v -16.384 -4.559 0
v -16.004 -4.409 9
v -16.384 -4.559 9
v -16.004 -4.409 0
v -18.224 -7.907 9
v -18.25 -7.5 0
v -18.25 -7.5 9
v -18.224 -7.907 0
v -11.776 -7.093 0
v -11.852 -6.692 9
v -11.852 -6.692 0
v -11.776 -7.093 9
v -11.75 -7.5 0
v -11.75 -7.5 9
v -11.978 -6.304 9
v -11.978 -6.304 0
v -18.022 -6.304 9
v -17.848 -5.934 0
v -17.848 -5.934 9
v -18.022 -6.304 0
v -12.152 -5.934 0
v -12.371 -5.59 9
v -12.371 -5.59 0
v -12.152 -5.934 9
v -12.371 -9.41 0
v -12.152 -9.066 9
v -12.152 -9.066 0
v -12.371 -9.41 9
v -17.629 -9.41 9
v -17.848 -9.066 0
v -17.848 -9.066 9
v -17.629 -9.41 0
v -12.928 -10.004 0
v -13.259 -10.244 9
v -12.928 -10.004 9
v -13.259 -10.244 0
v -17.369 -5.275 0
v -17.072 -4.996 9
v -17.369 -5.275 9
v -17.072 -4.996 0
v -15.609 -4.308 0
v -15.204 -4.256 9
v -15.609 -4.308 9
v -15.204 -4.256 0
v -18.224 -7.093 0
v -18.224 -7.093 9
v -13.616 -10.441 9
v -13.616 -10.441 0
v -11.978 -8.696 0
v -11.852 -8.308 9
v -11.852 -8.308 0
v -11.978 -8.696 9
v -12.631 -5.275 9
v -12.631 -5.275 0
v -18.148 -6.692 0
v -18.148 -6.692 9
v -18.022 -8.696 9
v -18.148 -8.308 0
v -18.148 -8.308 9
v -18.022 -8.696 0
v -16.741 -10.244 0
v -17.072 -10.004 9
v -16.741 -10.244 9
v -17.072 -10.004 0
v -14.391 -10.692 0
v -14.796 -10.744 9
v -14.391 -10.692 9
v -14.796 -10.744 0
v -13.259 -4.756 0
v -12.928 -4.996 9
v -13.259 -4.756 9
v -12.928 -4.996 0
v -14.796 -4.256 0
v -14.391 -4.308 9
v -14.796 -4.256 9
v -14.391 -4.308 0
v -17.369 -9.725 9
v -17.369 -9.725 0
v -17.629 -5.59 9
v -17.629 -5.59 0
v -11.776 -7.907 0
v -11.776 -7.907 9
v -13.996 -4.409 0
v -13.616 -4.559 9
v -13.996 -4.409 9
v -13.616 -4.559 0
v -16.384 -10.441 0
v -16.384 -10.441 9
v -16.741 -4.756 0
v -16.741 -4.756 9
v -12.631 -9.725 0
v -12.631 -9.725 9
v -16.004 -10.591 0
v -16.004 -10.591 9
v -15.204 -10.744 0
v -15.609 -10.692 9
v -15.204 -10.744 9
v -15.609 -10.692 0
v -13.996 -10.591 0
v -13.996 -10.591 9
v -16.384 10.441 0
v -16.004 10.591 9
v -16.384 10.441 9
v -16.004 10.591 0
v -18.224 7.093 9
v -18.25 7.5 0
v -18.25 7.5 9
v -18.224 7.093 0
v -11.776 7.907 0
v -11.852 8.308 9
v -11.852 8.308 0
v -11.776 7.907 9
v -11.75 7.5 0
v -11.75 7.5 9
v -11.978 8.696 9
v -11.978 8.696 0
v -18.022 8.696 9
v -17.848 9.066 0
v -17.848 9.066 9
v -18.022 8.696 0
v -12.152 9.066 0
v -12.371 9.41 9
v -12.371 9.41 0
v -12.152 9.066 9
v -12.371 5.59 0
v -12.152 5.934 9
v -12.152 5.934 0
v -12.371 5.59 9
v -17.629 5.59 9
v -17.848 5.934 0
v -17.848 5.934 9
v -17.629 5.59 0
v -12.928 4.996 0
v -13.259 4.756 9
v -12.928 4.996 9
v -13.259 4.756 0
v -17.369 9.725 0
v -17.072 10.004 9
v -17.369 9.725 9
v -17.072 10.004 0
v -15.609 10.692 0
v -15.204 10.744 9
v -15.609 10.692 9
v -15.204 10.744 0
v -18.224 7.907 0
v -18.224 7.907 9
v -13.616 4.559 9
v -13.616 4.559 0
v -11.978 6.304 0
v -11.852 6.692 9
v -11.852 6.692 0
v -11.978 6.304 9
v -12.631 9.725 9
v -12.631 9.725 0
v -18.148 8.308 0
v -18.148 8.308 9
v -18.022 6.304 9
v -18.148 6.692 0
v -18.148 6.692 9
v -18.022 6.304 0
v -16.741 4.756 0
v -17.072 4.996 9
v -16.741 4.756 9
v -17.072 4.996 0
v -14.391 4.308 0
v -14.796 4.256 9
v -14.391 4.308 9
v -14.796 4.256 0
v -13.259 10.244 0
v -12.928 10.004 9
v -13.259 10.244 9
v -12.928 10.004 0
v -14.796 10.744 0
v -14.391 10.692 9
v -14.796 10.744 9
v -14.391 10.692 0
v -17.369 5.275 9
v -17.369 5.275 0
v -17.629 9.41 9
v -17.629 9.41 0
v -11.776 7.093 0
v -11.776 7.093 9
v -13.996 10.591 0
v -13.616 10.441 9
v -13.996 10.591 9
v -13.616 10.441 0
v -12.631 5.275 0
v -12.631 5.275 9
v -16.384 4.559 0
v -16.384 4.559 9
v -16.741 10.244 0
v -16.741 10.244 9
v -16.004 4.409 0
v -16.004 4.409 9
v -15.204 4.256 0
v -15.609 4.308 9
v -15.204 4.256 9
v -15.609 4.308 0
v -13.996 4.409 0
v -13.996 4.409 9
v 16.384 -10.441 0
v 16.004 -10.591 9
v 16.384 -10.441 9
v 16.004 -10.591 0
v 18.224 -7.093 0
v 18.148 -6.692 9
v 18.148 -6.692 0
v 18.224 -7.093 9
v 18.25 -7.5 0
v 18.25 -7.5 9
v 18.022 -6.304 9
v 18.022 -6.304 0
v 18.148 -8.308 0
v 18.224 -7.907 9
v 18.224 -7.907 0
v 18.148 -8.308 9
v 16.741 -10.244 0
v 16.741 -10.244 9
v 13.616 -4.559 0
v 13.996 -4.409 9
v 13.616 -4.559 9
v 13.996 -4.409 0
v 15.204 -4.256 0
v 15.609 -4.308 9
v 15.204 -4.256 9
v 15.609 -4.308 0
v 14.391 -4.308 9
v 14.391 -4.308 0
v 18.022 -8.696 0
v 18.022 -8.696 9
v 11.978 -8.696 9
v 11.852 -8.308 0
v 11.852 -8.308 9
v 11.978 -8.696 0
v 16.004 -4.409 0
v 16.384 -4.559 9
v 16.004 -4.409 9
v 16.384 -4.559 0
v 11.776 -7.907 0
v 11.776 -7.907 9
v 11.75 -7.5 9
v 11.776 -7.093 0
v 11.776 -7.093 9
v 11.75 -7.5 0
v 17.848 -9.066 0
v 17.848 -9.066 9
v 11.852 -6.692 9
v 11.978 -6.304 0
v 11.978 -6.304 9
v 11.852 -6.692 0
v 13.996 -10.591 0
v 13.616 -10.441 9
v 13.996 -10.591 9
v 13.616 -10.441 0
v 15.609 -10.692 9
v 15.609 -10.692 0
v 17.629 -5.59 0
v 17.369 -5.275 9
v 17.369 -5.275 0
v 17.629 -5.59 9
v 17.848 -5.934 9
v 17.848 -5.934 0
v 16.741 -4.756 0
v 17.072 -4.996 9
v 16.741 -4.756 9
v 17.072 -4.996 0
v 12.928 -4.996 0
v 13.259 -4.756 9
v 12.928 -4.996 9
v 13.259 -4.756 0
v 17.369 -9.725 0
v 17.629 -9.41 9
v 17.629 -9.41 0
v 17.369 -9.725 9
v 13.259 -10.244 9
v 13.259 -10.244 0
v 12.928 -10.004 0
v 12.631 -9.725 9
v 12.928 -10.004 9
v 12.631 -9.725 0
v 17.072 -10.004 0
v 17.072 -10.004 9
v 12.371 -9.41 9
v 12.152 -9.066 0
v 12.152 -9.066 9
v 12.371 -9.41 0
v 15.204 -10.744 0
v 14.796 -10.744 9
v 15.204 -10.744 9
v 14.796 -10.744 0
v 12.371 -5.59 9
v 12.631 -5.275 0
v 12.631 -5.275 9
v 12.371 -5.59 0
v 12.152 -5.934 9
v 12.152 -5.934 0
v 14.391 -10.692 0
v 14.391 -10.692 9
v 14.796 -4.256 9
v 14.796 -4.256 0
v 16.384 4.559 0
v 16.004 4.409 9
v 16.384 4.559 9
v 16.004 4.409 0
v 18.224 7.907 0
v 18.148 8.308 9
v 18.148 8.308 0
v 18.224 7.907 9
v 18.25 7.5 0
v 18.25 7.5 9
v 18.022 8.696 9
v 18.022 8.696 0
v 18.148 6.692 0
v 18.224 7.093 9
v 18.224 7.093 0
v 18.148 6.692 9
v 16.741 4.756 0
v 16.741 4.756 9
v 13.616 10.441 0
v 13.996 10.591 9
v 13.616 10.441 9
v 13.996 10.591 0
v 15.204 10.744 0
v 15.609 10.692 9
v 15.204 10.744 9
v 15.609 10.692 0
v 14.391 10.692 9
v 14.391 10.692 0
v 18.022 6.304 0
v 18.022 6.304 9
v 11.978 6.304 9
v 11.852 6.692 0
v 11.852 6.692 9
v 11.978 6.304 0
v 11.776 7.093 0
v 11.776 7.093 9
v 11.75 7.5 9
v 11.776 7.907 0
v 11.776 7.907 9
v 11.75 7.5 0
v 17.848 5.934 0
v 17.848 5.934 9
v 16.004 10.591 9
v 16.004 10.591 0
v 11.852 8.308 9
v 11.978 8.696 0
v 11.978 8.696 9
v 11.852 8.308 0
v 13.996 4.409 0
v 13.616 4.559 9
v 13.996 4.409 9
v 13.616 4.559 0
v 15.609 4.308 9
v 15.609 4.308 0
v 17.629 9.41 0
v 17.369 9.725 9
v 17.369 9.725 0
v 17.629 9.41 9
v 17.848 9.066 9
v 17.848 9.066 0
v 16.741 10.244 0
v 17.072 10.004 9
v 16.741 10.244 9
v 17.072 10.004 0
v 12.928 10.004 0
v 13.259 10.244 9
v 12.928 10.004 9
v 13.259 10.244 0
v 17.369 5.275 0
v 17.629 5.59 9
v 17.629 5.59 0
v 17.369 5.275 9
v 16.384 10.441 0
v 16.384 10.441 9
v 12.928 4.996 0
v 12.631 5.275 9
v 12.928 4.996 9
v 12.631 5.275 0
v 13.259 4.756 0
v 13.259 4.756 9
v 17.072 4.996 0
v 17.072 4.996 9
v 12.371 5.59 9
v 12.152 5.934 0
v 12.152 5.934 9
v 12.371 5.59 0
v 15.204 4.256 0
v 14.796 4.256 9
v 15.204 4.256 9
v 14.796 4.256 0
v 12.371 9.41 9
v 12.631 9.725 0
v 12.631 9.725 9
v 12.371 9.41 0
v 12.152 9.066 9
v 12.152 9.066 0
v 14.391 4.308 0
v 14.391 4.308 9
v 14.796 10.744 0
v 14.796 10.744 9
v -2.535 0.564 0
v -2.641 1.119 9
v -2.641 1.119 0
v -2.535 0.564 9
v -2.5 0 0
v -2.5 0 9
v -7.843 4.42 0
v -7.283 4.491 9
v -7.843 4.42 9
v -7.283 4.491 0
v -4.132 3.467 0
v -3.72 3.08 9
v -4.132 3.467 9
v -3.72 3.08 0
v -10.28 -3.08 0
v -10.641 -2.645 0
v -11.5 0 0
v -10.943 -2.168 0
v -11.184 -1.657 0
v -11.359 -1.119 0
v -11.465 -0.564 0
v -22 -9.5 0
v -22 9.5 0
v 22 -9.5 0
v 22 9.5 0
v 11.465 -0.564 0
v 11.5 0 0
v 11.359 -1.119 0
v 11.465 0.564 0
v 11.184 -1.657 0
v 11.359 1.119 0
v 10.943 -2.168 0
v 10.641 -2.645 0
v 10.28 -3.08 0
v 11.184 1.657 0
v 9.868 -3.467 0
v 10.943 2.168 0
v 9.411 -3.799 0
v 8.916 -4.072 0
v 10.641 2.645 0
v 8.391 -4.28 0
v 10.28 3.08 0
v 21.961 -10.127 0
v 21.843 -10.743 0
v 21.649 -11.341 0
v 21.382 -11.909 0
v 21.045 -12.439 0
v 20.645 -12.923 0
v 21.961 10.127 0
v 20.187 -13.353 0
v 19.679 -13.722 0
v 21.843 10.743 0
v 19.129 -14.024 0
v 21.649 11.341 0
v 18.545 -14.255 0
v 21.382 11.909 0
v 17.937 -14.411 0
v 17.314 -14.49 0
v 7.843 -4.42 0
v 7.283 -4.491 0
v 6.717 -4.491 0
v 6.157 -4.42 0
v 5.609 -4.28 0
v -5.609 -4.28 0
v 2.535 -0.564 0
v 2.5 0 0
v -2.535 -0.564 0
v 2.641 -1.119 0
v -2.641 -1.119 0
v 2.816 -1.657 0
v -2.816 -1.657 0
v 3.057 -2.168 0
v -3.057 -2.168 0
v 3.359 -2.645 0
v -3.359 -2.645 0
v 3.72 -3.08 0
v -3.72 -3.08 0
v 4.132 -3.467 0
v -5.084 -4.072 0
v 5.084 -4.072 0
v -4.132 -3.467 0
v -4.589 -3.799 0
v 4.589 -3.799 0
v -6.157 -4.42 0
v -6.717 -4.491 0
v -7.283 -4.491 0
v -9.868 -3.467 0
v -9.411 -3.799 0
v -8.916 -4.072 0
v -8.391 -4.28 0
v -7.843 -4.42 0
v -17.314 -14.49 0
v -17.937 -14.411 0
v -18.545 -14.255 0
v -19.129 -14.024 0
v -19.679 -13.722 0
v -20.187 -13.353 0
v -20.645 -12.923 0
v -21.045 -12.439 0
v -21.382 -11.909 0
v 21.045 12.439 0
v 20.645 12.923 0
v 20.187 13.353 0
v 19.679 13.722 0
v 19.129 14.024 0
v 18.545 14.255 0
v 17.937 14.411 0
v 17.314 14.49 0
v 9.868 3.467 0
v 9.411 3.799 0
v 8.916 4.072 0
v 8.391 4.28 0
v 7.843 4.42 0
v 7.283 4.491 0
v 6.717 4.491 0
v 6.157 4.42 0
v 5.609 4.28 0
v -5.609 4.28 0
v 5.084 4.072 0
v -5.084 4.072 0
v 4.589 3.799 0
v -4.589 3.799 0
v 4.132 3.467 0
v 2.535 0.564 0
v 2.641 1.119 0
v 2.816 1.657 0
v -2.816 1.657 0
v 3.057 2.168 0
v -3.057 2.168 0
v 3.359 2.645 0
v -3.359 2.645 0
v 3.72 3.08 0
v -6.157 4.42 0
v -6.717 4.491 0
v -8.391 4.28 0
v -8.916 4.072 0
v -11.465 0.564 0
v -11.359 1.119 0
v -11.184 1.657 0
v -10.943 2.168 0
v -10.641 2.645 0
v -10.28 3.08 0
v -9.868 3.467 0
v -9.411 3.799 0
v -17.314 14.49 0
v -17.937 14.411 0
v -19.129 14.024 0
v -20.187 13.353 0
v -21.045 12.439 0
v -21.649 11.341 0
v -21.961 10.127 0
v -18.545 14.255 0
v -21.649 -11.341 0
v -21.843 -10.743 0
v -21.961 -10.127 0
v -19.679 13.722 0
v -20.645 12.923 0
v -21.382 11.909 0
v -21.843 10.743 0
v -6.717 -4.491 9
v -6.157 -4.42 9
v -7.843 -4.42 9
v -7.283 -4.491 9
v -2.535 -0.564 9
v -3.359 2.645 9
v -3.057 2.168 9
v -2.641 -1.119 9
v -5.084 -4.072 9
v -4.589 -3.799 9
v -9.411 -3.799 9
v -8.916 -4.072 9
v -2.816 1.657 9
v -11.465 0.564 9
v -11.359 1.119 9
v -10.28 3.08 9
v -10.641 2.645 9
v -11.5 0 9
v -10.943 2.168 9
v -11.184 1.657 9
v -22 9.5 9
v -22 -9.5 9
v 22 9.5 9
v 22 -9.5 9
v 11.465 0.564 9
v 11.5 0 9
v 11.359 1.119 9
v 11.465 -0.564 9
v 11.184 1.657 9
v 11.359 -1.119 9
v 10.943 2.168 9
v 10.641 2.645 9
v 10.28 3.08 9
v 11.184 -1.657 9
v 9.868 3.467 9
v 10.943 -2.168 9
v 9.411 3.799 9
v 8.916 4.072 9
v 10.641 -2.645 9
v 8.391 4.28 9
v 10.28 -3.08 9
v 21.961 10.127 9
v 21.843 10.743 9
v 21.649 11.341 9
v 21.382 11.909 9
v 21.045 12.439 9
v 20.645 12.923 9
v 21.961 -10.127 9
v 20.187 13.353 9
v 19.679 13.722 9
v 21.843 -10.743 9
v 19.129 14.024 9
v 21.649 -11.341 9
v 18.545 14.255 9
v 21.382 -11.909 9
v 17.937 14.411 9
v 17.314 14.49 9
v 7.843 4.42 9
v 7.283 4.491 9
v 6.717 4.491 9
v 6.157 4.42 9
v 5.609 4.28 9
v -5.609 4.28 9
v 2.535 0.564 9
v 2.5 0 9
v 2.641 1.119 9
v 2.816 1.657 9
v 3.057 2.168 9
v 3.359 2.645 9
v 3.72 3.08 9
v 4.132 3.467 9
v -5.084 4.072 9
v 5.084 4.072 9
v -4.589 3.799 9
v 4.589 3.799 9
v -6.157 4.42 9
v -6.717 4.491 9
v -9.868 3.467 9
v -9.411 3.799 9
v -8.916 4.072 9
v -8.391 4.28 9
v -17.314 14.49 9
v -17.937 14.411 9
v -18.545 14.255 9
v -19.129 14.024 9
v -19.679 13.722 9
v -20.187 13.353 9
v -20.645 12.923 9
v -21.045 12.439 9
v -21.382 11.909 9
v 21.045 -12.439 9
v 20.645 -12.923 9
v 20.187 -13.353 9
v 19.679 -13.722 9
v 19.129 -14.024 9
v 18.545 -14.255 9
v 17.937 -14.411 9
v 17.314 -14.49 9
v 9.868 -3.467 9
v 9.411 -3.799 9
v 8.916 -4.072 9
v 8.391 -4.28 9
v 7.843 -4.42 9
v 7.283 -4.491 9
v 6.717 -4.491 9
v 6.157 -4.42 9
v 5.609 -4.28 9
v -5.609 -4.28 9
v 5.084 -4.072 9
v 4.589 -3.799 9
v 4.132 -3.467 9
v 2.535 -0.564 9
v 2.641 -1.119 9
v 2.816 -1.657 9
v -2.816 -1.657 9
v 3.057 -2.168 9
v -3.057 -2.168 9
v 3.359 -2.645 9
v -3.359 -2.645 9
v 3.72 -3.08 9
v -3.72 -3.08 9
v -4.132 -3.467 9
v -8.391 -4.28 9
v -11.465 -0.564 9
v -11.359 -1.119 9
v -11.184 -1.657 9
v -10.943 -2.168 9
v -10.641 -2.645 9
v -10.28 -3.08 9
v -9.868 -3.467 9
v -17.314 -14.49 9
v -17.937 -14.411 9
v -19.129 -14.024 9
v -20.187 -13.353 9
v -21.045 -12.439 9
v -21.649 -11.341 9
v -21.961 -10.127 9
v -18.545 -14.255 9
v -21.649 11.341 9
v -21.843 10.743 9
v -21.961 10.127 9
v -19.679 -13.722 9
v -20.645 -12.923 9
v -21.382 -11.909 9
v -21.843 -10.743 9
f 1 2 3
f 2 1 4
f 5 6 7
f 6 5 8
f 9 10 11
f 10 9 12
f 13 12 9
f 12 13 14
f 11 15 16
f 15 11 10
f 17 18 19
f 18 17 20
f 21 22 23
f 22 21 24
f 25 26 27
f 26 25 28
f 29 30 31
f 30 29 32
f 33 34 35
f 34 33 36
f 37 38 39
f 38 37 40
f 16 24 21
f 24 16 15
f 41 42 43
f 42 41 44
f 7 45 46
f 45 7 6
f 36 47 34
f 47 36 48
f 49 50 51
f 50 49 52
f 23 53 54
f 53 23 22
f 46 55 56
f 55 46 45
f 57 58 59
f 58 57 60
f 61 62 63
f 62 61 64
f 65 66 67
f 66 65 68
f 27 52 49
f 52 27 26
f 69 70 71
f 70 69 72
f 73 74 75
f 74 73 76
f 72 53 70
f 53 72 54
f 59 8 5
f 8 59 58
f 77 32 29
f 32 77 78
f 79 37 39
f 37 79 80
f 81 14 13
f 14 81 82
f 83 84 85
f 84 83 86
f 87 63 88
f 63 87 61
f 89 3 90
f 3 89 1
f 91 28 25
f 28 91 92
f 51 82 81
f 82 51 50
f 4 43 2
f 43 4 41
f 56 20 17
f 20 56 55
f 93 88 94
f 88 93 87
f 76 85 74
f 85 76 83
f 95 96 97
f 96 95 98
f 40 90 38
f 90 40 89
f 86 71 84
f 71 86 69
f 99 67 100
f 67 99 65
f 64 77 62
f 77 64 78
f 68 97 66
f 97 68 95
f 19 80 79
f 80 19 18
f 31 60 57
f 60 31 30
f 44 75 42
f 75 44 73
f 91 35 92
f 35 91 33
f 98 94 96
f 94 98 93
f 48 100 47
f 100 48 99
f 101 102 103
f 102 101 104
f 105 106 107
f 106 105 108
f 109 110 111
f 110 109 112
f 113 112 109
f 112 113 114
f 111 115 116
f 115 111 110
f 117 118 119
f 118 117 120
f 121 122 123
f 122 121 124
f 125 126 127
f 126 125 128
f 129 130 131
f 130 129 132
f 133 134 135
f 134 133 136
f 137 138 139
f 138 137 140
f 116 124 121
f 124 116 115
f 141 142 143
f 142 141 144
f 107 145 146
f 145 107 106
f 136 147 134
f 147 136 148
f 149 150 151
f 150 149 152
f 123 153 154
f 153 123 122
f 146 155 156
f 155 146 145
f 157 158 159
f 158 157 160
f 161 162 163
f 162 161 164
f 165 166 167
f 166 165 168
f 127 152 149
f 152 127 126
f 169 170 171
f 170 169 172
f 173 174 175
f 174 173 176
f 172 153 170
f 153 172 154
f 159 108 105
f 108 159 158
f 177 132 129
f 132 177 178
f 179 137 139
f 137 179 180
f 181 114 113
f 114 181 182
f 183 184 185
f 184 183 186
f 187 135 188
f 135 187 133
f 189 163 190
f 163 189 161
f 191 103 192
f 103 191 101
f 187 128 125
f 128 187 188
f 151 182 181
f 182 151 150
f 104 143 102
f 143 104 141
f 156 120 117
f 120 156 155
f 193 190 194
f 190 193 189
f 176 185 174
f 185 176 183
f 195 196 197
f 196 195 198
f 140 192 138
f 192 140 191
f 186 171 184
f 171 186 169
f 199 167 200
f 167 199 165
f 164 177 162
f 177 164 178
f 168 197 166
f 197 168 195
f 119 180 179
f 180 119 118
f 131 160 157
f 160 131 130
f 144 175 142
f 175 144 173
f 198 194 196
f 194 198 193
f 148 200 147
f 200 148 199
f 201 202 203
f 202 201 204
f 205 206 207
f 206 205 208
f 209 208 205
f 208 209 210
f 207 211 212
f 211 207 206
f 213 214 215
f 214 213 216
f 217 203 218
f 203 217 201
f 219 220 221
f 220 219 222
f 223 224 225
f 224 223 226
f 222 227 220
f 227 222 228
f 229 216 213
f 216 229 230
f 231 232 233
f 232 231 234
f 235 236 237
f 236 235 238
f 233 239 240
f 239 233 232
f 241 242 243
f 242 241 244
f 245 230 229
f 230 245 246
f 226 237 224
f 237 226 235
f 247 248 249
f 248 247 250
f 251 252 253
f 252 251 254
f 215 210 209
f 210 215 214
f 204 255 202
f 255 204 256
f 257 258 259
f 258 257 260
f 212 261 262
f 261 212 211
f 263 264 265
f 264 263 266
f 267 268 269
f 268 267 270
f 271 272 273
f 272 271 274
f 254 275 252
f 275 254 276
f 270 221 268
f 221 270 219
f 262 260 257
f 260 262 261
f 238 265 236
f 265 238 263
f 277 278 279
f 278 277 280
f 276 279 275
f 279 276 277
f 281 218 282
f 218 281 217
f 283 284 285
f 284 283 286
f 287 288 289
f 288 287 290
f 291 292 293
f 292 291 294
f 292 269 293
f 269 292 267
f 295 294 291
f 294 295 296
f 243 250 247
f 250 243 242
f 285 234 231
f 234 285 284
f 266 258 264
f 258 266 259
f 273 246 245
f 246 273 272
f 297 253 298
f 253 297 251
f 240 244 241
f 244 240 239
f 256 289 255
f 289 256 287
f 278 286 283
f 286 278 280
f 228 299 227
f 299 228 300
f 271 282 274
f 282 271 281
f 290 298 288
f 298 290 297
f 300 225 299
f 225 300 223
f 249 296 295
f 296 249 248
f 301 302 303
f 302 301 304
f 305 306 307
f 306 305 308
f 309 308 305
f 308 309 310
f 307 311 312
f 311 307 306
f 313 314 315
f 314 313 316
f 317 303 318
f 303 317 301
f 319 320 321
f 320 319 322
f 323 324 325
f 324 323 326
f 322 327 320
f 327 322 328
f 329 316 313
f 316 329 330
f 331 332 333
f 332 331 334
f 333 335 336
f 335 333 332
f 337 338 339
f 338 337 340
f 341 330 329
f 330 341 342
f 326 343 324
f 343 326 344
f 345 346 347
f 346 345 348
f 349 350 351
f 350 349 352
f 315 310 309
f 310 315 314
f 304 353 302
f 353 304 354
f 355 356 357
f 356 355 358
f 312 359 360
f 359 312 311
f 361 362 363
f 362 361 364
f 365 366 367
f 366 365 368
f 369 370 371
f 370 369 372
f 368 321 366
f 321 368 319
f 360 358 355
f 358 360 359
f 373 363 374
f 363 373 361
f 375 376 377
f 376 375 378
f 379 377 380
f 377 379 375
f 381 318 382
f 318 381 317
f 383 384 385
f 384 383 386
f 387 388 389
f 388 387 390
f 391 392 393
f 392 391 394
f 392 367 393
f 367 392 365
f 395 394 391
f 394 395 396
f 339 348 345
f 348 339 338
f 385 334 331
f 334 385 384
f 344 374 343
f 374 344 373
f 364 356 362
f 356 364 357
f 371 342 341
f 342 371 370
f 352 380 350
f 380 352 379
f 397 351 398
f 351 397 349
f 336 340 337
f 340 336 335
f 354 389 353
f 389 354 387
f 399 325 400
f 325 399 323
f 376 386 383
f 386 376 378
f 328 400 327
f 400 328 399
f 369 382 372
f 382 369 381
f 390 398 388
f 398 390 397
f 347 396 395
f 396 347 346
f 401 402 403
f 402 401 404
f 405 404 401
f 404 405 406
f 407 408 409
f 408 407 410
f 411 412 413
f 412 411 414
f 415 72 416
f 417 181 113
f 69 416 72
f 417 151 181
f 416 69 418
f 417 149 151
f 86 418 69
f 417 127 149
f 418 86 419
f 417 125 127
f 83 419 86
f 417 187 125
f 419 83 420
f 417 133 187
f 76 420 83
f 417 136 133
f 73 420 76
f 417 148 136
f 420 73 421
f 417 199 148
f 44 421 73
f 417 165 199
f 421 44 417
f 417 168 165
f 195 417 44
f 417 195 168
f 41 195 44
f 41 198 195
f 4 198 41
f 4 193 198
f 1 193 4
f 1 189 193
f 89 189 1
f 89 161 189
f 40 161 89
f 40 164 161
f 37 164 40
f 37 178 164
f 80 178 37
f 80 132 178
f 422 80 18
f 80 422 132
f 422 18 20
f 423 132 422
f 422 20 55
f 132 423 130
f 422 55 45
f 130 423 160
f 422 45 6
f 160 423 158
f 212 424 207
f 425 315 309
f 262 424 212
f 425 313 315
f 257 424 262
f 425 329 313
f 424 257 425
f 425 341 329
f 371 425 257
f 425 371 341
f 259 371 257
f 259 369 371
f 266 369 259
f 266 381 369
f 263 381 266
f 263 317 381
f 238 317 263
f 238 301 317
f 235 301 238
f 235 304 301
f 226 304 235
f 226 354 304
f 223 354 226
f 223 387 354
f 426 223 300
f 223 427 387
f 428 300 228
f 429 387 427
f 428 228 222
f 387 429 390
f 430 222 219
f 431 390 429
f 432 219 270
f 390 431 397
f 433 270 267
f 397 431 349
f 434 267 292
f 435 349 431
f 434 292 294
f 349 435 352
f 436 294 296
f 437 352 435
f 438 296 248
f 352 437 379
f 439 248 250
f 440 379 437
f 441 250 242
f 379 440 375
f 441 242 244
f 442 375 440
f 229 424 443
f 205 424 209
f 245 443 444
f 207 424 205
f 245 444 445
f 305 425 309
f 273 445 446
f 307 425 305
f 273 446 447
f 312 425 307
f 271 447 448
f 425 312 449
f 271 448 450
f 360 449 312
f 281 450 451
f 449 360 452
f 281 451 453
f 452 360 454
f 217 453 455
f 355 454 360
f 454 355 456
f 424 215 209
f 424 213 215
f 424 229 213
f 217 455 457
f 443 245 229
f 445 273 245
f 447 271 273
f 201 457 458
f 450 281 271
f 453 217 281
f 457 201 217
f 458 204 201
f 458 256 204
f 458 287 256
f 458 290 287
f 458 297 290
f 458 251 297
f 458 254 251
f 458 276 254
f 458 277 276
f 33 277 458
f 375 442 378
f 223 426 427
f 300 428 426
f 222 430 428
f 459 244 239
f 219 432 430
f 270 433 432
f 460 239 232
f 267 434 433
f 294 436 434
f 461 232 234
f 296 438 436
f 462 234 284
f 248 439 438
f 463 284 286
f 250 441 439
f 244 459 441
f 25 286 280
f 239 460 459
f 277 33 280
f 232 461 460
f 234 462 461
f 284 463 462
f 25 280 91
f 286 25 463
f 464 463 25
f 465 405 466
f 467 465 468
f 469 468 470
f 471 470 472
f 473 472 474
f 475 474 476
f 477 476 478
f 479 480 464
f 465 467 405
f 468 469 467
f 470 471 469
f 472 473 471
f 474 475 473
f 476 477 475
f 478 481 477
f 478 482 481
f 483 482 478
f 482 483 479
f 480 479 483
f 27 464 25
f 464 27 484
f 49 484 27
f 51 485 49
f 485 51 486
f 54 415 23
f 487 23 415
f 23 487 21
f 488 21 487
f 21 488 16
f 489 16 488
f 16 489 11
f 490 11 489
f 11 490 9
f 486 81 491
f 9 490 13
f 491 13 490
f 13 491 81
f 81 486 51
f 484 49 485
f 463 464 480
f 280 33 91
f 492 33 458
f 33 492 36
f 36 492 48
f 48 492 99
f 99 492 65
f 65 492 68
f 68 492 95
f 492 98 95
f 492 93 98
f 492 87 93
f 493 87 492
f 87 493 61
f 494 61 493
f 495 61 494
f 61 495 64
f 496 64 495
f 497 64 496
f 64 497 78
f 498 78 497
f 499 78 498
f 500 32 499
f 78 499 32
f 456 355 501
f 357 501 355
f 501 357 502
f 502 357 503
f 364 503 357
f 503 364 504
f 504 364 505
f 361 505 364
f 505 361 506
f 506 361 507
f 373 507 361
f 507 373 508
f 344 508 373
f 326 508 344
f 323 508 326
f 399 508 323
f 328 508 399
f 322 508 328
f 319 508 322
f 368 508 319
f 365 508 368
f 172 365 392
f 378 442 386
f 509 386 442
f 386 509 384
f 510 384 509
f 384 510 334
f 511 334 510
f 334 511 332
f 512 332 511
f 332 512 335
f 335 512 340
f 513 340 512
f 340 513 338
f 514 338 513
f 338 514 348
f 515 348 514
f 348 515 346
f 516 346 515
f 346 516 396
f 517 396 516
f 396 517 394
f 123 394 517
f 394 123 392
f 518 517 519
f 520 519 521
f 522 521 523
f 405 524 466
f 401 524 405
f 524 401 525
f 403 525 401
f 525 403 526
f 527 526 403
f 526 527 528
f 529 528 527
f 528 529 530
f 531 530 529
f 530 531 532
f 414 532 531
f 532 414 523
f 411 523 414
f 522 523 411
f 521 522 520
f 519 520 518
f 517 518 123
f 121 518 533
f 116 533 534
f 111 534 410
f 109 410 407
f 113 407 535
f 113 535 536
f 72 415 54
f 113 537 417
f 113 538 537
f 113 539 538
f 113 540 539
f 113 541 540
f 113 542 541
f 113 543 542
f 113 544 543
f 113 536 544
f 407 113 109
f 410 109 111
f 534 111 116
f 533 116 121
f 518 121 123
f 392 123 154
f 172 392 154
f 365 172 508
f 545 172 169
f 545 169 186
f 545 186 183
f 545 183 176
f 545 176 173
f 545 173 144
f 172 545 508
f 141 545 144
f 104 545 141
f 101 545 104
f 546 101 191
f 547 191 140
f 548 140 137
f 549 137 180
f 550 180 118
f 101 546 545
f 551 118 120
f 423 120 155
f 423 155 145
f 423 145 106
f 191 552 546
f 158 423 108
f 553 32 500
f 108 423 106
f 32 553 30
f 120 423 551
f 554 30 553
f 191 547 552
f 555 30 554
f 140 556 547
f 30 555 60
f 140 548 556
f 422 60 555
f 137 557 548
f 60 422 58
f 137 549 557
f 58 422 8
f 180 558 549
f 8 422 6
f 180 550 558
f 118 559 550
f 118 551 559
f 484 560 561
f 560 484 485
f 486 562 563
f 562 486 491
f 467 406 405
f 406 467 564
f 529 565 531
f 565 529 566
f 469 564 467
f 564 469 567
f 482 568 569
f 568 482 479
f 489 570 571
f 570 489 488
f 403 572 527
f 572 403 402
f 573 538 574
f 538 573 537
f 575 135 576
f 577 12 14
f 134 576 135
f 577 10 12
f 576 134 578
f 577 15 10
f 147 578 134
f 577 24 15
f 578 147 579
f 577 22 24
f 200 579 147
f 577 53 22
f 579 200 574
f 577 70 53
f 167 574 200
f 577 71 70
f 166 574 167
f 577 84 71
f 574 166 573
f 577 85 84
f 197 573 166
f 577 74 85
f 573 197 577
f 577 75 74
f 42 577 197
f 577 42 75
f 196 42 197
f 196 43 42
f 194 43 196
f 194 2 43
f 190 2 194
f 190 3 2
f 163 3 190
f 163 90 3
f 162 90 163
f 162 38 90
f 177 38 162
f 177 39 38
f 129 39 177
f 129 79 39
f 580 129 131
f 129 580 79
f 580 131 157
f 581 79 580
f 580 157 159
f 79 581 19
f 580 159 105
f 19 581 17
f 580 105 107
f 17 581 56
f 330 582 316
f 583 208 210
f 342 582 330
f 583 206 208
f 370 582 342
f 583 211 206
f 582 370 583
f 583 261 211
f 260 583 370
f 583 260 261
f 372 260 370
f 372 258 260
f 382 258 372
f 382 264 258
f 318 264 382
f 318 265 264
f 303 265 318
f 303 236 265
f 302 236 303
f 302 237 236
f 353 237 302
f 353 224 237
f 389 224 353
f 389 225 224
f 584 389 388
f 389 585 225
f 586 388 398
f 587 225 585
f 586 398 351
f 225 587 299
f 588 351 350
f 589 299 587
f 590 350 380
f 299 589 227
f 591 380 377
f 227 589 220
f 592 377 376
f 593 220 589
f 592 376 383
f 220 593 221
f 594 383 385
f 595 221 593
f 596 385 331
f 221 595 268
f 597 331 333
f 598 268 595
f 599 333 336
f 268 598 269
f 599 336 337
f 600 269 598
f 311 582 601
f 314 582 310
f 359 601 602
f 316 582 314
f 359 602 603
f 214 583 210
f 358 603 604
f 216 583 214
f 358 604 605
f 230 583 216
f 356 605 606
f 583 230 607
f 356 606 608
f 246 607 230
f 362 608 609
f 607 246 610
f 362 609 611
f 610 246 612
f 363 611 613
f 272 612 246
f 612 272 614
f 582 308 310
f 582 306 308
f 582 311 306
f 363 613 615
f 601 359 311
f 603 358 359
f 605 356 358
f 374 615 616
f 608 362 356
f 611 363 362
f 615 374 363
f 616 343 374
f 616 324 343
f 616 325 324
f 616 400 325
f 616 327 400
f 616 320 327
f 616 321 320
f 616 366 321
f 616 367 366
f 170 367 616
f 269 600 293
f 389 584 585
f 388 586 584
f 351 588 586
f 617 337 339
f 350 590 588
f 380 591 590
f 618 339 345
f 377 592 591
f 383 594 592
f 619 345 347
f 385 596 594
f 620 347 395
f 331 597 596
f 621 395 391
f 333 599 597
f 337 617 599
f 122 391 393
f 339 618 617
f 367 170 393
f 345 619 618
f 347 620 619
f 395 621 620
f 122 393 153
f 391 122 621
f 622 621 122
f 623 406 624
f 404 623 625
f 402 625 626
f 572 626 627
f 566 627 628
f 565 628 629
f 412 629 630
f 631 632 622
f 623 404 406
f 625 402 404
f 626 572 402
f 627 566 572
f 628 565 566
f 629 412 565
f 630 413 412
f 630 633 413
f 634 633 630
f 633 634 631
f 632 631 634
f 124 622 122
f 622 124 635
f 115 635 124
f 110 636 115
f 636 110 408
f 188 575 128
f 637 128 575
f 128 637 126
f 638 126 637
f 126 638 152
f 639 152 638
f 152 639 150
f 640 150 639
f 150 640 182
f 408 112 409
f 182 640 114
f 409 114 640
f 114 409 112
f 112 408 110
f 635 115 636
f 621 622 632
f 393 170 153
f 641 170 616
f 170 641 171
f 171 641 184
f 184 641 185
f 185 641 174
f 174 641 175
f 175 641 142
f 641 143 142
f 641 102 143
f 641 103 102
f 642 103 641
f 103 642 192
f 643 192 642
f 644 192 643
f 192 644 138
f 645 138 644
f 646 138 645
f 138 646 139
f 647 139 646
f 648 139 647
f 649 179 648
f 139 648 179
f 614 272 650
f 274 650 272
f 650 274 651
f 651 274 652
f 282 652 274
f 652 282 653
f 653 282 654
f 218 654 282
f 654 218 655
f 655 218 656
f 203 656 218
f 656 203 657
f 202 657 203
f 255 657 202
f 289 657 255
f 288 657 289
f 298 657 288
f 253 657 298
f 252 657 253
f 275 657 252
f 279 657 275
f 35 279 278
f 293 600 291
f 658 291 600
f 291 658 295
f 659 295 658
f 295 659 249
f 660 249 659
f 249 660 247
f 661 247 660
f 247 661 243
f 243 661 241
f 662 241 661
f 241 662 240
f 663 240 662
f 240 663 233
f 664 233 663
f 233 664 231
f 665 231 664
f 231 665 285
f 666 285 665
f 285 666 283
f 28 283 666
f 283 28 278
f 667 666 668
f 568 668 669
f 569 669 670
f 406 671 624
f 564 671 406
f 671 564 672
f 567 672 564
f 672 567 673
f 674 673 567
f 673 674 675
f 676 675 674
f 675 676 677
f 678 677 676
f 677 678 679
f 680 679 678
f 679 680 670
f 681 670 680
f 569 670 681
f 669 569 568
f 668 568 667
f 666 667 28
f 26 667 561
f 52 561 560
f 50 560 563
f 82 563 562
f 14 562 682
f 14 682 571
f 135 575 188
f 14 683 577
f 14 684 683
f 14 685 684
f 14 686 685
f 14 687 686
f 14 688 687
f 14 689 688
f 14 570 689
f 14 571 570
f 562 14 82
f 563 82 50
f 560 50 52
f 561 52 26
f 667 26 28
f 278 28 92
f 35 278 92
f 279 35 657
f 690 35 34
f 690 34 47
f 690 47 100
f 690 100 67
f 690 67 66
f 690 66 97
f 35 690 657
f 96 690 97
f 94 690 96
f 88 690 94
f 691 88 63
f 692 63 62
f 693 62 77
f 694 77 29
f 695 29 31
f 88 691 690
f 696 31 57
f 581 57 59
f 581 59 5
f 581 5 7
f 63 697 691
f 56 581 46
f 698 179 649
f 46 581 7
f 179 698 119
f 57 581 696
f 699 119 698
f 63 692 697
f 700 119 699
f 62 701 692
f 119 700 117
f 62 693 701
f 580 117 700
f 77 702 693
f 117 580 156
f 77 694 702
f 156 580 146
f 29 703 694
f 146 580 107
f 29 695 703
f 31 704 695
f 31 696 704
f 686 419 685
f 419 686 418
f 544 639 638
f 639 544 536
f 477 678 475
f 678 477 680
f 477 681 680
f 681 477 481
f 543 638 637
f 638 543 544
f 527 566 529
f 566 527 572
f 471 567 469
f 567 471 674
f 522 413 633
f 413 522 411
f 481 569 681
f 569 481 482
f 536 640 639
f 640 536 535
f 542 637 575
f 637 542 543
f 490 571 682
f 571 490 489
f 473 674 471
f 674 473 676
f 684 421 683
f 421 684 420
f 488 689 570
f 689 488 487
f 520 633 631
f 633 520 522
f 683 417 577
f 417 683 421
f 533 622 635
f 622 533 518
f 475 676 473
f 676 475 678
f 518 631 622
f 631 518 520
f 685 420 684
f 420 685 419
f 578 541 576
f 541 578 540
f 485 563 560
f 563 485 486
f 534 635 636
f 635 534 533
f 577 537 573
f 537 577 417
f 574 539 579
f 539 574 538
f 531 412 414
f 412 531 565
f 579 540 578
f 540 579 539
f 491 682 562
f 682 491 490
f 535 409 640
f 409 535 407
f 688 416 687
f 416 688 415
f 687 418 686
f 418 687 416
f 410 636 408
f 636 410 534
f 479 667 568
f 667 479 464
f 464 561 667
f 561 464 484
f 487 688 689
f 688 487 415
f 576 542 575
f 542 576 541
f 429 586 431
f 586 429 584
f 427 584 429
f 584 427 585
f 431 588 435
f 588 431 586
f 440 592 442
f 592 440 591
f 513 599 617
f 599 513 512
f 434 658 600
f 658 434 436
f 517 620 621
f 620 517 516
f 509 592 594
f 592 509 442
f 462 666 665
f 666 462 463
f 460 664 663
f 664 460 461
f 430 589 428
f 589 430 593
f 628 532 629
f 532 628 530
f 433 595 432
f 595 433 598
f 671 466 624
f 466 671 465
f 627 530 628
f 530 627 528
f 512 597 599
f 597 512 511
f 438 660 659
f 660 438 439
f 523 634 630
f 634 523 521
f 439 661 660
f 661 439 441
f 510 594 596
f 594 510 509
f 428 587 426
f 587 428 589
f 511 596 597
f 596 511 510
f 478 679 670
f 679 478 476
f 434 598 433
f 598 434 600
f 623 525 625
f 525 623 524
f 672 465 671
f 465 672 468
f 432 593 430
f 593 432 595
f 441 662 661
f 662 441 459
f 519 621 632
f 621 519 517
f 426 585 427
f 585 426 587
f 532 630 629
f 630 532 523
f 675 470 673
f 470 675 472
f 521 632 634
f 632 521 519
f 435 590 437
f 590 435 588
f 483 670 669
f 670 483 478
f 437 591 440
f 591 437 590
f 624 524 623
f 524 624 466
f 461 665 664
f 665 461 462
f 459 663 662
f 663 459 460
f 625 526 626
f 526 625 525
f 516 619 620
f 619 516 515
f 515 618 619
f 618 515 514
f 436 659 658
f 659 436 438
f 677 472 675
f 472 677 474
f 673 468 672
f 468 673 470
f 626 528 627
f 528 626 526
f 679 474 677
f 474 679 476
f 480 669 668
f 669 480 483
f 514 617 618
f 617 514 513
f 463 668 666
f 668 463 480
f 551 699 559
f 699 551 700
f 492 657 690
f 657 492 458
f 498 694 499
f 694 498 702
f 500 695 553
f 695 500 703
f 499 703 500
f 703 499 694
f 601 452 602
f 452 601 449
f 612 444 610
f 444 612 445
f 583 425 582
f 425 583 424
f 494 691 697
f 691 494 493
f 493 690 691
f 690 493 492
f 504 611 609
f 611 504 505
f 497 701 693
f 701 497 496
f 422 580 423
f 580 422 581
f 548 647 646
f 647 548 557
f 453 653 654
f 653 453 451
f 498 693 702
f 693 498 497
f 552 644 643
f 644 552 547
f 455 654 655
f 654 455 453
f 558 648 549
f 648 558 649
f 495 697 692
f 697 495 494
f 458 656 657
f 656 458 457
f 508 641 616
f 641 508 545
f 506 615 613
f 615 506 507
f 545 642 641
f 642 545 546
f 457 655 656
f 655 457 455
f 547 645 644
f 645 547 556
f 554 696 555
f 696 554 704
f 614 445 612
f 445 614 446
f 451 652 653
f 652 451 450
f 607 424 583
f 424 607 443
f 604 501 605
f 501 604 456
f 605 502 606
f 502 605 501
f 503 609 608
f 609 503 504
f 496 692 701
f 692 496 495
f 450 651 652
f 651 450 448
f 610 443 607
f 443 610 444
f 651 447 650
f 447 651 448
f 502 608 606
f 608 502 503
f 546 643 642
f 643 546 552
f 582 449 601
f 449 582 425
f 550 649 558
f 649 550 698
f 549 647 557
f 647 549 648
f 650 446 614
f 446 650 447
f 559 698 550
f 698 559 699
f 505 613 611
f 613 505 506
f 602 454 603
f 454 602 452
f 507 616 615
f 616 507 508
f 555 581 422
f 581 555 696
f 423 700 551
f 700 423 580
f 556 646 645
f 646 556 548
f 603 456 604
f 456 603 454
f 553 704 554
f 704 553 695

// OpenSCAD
$fn = 50;


difference() {
	union() {
		hull() {
			translate(v = [-17.0000000000, 9.5000000000, 0]) {
				cylinder(h = 9, r = 5);
			}
			translate(v = [17.0000000000, 9.5000000000, 0]) {
				cylinder(h = 9, r = 5);
			}
			translate(v = [-17.0000000000, -9.5000000000, 0]) {
				cylinder(h = 9, r = 5);
			}
			translate(v = [17.0000000000, -9.5000000000, 0]) {
				cylinder(h = 9, r = 5);
			}
		}
	}
	union() {
		#translate(v = [-15.0000000000, -7.5000000000, -100.0000000000]) {
			cylinder(h = 200, r = 3.2500000000);
		}
		#translate(v = [-15.0000000000, 7.5000000000, -100.0000000000]) {
			cylinder(h = 200, r = 3.2500000000);
		}
		#translate(v = [15.0000000000, -7.5000000000, -100.0000000000]) {
			cylinder(h = 200, r = 3.2500000000);
		}
		#translate(v = [15.0000000000, 7.5000000000, -100.0000000000]) {
			cylinder(h = 200, r = 3.2500000000);
		}
		#translate(v = [-7.0000000000, 0, 0]) {
			cylinder(h = 9, r = 4.5000000000);
		}
		#translate(v = [7.0000000000, 0, 0]) {
			cylinder(h = 9, r = 4.5000000000);
		}
	}
}
